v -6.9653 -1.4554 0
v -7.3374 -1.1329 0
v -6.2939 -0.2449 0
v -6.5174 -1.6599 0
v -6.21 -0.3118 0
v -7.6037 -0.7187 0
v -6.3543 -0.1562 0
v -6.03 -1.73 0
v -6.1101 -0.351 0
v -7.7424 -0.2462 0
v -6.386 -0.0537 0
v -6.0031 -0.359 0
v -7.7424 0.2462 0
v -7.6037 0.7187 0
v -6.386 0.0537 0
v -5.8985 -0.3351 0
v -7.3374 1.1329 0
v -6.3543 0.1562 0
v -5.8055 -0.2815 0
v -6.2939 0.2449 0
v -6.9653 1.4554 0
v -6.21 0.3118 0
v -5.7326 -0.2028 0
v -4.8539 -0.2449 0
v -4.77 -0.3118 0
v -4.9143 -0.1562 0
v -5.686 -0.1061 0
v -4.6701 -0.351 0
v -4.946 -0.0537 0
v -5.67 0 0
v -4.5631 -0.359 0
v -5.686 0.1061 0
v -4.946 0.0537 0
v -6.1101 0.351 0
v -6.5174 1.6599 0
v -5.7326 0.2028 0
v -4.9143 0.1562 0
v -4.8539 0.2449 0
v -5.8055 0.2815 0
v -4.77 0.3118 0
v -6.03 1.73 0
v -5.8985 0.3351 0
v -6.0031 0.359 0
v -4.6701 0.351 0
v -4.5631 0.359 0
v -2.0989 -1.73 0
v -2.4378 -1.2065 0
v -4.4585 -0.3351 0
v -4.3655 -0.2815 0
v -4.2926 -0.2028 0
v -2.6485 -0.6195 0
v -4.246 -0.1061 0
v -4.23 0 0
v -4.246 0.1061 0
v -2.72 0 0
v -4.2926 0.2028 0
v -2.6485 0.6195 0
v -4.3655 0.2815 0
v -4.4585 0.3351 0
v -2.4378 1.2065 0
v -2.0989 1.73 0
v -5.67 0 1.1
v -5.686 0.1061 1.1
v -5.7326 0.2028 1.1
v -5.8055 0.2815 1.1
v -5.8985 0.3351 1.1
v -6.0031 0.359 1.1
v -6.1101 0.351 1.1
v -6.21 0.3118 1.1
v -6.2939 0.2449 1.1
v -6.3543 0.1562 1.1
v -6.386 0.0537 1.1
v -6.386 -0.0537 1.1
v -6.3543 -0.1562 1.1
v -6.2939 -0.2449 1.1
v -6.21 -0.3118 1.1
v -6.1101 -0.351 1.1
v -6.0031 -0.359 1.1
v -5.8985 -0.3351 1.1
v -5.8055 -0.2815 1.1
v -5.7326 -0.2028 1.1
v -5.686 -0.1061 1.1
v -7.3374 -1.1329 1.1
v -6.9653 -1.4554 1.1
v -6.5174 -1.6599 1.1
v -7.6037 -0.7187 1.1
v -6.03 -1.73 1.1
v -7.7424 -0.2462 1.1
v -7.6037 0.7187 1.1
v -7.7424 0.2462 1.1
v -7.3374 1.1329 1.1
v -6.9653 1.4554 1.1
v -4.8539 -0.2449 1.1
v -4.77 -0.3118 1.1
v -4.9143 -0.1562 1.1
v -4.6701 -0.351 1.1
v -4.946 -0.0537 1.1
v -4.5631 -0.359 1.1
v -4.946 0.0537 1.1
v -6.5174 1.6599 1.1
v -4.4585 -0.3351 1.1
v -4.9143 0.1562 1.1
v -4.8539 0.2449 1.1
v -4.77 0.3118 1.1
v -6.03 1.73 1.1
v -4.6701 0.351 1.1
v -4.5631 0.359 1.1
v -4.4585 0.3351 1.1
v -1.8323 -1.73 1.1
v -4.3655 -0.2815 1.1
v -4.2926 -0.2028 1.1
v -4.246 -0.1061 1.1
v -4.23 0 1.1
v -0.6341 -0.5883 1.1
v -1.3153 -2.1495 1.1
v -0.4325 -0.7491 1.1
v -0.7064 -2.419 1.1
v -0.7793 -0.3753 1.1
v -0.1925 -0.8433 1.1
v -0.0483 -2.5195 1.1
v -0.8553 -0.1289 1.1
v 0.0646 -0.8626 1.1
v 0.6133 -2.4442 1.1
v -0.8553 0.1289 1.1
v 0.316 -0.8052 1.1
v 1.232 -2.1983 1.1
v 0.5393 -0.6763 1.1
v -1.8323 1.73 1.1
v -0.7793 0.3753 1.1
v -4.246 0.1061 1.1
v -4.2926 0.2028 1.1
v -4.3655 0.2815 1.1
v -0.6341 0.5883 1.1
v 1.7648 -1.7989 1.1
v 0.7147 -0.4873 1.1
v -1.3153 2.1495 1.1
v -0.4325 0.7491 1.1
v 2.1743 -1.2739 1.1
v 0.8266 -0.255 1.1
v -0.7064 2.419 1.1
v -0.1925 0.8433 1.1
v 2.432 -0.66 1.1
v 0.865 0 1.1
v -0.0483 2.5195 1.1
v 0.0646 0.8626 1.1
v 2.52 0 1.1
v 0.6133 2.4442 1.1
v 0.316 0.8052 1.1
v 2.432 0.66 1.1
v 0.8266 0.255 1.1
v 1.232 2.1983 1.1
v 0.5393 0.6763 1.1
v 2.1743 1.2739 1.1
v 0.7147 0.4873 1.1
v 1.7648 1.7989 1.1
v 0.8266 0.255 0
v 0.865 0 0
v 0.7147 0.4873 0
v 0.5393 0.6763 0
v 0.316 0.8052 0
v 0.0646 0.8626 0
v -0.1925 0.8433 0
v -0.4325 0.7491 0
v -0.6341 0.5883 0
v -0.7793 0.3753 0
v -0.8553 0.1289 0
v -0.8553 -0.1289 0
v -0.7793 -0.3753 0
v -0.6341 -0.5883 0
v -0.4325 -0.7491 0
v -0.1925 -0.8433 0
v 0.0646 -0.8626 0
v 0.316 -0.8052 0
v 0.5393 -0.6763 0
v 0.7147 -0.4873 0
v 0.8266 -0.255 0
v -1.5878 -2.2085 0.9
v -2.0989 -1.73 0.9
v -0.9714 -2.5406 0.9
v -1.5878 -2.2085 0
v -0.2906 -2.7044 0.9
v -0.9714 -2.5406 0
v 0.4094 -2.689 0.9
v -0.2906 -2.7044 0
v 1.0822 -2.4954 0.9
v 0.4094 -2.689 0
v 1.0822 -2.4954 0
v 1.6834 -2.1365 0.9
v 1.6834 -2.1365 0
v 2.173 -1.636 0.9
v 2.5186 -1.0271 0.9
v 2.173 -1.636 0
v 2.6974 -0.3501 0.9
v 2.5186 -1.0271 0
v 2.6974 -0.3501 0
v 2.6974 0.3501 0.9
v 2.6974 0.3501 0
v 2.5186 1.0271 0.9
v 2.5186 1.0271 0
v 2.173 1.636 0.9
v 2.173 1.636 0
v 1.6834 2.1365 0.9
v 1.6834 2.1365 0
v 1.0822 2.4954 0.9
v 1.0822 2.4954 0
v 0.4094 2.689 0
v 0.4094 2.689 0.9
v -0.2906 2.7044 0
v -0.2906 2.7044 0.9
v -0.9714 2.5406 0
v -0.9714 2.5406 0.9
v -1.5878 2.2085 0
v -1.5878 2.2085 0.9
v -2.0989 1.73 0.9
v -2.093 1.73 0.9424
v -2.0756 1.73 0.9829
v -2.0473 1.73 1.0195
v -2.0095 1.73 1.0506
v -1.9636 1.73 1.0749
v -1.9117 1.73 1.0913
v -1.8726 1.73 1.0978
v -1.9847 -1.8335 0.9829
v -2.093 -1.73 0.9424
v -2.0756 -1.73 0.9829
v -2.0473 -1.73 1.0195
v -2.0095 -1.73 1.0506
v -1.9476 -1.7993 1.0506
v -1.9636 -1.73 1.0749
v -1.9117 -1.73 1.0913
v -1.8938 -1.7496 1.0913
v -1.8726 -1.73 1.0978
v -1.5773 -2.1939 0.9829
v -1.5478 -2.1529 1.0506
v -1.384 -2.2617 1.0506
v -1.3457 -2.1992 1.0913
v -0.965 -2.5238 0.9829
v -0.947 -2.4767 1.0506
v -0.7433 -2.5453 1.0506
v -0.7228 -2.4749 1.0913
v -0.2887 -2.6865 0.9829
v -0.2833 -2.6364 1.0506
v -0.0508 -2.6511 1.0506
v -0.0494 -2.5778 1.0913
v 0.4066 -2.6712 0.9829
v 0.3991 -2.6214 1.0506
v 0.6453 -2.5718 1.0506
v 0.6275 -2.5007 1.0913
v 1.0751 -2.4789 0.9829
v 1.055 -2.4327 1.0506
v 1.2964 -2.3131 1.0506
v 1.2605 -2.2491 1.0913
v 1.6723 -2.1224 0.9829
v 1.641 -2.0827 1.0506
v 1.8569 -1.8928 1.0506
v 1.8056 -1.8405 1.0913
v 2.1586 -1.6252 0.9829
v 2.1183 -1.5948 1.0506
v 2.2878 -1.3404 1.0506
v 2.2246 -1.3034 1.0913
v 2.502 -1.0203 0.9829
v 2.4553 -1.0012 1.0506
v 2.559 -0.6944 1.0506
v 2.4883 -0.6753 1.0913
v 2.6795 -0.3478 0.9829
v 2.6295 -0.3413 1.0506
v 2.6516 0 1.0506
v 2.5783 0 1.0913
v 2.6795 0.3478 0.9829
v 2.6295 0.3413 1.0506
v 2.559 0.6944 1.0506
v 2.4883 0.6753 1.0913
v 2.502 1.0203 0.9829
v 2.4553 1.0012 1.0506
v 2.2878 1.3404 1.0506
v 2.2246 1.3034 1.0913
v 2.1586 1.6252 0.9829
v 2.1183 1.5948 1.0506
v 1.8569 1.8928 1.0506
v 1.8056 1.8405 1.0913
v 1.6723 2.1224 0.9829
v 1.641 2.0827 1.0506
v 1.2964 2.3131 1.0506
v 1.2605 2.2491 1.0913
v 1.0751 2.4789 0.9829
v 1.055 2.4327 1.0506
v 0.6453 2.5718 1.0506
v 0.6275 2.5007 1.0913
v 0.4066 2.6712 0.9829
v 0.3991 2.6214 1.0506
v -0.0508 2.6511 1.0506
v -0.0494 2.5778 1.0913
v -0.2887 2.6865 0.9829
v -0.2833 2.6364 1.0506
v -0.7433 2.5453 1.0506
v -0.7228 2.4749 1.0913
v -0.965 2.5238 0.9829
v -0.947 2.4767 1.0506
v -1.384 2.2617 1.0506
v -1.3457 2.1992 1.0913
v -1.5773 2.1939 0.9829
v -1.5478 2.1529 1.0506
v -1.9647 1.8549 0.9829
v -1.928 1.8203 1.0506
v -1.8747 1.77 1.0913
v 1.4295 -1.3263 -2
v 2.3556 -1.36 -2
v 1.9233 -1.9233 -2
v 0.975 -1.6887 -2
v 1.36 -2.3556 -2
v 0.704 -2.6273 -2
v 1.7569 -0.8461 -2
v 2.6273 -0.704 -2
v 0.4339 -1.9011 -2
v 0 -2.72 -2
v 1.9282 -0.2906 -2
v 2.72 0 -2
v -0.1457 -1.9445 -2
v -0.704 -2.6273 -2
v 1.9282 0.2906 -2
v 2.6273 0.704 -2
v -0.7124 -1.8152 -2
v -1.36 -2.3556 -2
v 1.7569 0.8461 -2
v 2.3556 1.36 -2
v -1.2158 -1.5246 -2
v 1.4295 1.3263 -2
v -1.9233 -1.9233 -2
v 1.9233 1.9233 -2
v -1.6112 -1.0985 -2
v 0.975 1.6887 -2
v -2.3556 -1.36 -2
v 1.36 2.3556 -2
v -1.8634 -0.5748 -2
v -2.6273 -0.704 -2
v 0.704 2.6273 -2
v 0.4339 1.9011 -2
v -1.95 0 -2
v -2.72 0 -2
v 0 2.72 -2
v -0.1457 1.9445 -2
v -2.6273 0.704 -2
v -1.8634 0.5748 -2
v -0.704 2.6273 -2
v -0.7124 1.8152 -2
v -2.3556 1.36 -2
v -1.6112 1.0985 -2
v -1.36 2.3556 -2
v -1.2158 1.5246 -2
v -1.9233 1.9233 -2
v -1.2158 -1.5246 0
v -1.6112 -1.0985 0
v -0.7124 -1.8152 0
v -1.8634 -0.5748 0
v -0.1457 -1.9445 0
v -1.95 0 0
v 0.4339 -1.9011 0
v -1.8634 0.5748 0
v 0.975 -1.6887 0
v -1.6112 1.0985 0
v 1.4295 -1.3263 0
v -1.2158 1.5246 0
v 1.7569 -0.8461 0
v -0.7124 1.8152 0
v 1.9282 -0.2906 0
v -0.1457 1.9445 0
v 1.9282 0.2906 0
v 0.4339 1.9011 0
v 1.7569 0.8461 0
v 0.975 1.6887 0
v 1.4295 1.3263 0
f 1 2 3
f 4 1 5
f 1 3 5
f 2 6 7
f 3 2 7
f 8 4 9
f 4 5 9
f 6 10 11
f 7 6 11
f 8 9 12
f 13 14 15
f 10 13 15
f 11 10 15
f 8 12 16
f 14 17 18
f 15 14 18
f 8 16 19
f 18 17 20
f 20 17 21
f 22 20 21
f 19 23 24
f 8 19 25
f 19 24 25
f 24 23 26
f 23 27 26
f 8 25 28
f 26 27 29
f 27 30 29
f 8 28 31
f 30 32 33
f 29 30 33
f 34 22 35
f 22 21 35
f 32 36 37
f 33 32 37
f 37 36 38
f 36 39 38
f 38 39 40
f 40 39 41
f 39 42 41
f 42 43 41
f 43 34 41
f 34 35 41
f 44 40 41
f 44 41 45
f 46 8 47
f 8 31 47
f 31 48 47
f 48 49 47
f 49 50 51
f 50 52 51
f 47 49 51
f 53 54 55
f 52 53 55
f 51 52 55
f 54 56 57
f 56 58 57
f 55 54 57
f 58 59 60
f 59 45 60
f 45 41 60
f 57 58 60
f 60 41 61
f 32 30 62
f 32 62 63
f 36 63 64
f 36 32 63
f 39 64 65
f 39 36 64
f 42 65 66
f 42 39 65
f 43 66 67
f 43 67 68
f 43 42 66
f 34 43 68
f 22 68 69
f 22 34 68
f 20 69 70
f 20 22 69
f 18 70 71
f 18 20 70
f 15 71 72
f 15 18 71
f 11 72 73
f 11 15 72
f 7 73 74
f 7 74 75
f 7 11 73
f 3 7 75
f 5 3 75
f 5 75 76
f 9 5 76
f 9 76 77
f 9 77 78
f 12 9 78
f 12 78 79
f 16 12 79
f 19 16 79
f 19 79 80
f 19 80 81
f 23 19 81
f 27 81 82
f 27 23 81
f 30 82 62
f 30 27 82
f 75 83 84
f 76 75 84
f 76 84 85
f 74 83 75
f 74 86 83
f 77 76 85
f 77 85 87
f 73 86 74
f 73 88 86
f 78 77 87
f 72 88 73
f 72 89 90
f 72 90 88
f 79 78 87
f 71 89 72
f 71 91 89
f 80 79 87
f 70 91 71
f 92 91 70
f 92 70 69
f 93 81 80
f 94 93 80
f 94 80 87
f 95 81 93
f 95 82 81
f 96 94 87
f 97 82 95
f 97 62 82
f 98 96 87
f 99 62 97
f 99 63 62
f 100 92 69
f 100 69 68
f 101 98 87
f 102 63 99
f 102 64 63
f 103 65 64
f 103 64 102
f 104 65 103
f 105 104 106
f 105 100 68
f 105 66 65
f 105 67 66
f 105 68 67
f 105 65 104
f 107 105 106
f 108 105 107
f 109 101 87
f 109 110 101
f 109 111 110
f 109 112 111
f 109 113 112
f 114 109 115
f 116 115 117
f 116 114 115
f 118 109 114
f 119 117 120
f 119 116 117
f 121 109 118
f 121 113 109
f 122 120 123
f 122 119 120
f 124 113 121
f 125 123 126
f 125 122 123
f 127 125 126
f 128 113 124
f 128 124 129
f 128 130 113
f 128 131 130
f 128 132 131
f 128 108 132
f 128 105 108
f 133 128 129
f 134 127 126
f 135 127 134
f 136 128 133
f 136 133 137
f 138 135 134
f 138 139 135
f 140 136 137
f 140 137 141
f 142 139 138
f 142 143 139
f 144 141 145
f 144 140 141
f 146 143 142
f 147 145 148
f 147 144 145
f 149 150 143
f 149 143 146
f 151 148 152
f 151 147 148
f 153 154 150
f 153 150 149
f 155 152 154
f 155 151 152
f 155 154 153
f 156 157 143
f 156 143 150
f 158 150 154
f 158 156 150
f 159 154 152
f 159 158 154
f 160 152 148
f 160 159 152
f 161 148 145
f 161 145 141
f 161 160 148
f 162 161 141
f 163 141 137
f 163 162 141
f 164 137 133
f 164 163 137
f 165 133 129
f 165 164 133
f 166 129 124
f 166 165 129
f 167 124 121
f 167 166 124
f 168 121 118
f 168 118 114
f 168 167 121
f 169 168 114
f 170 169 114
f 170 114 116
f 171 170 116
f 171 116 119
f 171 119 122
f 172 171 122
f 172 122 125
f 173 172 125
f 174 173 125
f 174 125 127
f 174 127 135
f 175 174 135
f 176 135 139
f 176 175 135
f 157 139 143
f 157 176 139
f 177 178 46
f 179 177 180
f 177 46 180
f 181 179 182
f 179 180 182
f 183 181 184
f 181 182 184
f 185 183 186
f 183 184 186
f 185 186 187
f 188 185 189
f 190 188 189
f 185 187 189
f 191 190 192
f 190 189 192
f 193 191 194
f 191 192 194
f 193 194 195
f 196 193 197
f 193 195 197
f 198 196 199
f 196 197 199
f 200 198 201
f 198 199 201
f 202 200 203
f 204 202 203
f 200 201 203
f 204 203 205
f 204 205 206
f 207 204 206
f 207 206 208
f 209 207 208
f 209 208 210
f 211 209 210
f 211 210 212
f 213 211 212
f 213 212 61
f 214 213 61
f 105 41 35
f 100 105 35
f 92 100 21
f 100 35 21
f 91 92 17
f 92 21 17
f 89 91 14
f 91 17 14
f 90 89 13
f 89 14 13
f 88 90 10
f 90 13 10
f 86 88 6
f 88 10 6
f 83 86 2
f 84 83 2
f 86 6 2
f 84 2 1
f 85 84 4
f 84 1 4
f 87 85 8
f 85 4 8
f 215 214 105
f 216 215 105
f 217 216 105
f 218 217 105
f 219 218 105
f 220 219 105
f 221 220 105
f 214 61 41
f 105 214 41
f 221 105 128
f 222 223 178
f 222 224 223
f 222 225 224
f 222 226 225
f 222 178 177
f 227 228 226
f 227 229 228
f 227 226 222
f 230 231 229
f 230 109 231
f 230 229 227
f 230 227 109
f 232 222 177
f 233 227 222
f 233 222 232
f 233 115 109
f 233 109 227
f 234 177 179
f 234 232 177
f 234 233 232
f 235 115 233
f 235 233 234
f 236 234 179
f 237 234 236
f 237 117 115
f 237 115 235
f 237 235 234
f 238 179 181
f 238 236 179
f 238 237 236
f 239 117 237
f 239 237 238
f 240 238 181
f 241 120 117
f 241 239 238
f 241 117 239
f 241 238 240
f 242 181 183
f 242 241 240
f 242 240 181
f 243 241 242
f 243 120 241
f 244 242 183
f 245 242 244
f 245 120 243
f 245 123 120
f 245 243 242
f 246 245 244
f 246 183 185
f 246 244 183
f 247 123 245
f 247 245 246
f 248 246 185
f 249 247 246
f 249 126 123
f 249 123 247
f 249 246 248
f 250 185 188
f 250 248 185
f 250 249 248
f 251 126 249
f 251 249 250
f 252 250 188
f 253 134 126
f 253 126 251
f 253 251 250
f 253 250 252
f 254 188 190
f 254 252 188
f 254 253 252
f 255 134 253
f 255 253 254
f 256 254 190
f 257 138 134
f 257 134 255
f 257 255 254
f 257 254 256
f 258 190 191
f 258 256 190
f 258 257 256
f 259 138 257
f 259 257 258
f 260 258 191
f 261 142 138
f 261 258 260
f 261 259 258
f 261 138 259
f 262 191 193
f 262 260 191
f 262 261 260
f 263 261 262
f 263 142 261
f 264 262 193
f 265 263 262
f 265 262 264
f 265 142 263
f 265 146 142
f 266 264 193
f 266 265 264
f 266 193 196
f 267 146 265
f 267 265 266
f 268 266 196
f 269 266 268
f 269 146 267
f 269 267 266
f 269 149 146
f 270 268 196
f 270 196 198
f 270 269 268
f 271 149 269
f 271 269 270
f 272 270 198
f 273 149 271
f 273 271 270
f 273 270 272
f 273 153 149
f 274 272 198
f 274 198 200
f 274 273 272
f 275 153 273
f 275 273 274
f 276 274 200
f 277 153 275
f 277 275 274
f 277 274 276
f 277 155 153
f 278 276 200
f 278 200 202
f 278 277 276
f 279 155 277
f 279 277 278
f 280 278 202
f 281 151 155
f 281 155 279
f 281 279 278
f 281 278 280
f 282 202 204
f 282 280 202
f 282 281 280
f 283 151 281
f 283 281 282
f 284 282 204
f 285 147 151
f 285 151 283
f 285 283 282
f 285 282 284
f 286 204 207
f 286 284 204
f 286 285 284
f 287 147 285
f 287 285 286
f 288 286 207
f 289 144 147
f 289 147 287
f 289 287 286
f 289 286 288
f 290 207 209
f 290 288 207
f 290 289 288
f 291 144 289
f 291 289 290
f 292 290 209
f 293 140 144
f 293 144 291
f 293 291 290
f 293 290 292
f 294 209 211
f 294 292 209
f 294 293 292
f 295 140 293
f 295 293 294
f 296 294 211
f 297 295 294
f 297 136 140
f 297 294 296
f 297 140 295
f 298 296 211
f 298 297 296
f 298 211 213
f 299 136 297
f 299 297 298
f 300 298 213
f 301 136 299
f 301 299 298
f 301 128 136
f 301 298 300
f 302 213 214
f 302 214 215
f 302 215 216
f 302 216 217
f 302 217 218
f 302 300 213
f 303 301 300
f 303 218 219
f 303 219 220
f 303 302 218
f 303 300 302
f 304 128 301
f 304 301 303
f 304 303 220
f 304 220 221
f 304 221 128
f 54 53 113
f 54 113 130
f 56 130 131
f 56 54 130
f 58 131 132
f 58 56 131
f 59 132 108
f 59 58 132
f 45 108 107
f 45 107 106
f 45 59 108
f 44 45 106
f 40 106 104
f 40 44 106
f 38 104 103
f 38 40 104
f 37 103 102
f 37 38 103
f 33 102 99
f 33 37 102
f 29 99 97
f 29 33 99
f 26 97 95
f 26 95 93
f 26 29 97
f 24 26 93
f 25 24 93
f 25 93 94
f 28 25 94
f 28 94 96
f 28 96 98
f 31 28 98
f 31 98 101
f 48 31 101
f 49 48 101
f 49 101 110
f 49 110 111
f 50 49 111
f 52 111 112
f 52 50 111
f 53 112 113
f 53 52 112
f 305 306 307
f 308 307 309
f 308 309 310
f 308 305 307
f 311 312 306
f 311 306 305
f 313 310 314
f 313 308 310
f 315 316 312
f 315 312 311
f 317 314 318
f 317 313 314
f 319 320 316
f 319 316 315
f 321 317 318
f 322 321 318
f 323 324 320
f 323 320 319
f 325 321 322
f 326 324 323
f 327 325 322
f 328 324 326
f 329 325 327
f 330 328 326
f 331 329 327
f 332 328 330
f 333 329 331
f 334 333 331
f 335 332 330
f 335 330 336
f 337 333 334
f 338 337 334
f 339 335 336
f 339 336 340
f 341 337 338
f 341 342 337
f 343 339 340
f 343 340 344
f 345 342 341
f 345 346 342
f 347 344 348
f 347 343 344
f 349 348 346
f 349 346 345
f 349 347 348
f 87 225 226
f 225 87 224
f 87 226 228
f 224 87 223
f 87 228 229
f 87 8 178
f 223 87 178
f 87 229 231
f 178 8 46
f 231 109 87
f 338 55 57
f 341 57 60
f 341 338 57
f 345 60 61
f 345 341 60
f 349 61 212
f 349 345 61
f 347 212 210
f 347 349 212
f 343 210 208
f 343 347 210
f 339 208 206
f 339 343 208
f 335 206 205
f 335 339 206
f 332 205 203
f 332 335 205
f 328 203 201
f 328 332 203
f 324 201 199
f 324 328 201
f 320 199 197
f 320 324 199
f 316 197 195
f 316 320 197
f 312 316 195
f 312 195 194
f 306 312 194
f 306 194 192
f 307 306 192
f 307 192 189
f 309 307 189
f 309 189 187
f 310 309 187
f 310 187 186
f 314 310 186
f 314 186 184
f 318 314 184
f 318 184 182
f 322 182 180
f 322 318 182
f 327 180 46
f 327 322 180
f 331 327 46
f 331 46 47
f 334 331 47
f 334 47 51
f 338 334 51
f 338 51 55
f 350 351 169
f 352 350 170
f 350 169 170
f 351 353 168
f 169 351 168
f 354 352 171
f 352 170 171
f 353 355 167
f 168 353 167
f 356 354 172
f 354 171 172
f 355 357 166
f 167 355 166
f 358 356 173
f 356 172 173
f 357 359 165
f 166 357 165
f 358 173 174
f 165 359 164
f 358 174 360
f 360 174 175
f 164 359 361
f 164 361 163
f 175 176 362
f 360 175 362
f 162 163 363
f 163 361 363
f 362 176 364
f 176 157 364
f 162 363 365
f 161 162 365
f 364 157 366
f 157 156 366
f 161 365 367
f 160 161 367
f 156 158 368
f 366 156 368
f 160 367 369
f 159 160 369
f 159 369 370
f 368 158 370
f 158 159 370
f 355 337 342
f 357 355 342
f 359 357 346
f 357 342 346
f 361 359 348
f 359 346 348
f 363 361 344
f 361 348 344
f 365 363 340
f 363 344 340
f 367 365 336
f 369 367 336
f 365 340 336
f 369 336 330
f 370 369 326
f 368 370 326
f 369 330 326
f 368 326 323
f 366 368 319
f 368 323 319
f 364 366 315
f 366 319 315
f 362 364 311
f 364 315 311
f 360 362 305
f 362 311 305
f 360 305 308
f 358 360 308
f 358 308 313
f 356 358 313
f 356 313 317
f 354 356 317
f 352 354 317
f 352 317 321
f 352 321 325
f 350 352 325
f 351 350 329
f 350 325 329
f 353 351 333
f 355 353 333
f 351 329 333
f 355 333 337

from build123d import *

# Parameters (mm, degrees)
SKETCH_1_R      = 0.36
SKETCH_1_R_2    = 0.865
EXTRUDE_1_DEPTH = 1.1
EXTRUDE_START   = 2
SKETCH_2_R      = 2.7200000000000006
SKETCH_2_R_2    = 1.95
EXTRUDE_2_DEPTH = 2
FILLET_1_R      = 0.2


with BuildPart() as part:
    # 草图1 → 凸台-拉伸1 (new body)
    # profile 1 of 3: a face of its own
    with BuildSketch(Plane.XY):
        with BuildLine():
            Line((-2.0989282979654043, 1.7299999999999998), (-6.029999999999999, 1.7299999999999998))
            ThreePointArc((-6.029999999999999, 1.7299999999999995), (-7.759999999999999, -1.2e-16), (-6.029999999999999, -1.73))
            Line((-6.029999999999999, -1.7299999999999998), (-2.098928297965404, -1.7299999999999998))
            ThreePointArc((-2.0989282979654083, -1.7300000000000109), (-2.7200000000000006, 3.3e-16), (-2.098928297965408, 1.7300000000000115))
        make_face()
        with Locations((-6.029999999999999, 0)):
            Circle(SKETCH_1_R, mode=Mode.SUBTRACT)
        with Locations((-4.590000000000001, 0)):
            Circle(SKETCH_1_R, mode=Mode.SUBTRACT)
    # profile 2 of 3: a face of its own
    with BuildSketch(Plane.XY):
        with BuildLine():
            Line((0, 1.7299999999999998), (-2.0989282979654043, 1.7299999999999998))
            ThreePointArc((-2.098928297965408, 1.7300000000000115), (-2.7200000000000006, 3.3e-16), (-2.0989282979654083, -1.7300000000000109))
            Line((-2.098928297965404, -1.7299999999999998), (0, -1.7299999999999998))
            ThreePointArc((0, -1.7299999999999995), (1.7299999999999998, 1e-17), (2.1e-16, 1.73))
        make_face()
        Circle(SKETCH_1_R_2, mode=Mode.SUBTRACT)
    # profile 3 of 3: a face of its own
    with BuildSketch(Plane.XY):
        with BuildLine():
            ThreePointArc((2.7200000000000006, 0), (0.9190525092545292, 2.5600278289958016), (-2.098928297965408, 1.7300000000000115))
            Line((-2.0989282979654043, 1.7299999999999998), (0, 1.7299999999999998))
            ThreePointArc((2.1e-16, 1.73), (1.7299999999999998, 1e-17), (0, -1.7299999999999995))
            Line((0, -1.7299999999999998), (-2.098928297965404, -1.7299999999999998))
            ThreePointArc((-2.0989282979654083, -1.7300000000000109), (0.9190525092545296, -2.5600278289958016), (2.7200000000000006, -6.7e-16))
        make_face()
    extrude(amount=EXTRUDE_1_DEPTH)

    # 草图2 → 凸台-拉伸2 (add)
    with BuildSketch(Plane(origin=(0, 0, 0), x_dir=(-1, 0, 0), z_dir=(0, 0, -1)).offset(EXTRUDE_START)):
        Circle(SKETCH_2_R)
        Circle(SKETCH_2_R_2, mode=Mode.SUBTRACT)
    extrude(amount=-EXTRUDE_2_DEPTH)

    # 圆角1
    fillet_1_edges = [part.edges().sort_by_distance(p)[0] for p in [
        (2.7200000000000015, 1e-15, 1.1),
    ]]
    fillet(fillet_1_edges, radius=FILLET_1_R)


solid = part.part
